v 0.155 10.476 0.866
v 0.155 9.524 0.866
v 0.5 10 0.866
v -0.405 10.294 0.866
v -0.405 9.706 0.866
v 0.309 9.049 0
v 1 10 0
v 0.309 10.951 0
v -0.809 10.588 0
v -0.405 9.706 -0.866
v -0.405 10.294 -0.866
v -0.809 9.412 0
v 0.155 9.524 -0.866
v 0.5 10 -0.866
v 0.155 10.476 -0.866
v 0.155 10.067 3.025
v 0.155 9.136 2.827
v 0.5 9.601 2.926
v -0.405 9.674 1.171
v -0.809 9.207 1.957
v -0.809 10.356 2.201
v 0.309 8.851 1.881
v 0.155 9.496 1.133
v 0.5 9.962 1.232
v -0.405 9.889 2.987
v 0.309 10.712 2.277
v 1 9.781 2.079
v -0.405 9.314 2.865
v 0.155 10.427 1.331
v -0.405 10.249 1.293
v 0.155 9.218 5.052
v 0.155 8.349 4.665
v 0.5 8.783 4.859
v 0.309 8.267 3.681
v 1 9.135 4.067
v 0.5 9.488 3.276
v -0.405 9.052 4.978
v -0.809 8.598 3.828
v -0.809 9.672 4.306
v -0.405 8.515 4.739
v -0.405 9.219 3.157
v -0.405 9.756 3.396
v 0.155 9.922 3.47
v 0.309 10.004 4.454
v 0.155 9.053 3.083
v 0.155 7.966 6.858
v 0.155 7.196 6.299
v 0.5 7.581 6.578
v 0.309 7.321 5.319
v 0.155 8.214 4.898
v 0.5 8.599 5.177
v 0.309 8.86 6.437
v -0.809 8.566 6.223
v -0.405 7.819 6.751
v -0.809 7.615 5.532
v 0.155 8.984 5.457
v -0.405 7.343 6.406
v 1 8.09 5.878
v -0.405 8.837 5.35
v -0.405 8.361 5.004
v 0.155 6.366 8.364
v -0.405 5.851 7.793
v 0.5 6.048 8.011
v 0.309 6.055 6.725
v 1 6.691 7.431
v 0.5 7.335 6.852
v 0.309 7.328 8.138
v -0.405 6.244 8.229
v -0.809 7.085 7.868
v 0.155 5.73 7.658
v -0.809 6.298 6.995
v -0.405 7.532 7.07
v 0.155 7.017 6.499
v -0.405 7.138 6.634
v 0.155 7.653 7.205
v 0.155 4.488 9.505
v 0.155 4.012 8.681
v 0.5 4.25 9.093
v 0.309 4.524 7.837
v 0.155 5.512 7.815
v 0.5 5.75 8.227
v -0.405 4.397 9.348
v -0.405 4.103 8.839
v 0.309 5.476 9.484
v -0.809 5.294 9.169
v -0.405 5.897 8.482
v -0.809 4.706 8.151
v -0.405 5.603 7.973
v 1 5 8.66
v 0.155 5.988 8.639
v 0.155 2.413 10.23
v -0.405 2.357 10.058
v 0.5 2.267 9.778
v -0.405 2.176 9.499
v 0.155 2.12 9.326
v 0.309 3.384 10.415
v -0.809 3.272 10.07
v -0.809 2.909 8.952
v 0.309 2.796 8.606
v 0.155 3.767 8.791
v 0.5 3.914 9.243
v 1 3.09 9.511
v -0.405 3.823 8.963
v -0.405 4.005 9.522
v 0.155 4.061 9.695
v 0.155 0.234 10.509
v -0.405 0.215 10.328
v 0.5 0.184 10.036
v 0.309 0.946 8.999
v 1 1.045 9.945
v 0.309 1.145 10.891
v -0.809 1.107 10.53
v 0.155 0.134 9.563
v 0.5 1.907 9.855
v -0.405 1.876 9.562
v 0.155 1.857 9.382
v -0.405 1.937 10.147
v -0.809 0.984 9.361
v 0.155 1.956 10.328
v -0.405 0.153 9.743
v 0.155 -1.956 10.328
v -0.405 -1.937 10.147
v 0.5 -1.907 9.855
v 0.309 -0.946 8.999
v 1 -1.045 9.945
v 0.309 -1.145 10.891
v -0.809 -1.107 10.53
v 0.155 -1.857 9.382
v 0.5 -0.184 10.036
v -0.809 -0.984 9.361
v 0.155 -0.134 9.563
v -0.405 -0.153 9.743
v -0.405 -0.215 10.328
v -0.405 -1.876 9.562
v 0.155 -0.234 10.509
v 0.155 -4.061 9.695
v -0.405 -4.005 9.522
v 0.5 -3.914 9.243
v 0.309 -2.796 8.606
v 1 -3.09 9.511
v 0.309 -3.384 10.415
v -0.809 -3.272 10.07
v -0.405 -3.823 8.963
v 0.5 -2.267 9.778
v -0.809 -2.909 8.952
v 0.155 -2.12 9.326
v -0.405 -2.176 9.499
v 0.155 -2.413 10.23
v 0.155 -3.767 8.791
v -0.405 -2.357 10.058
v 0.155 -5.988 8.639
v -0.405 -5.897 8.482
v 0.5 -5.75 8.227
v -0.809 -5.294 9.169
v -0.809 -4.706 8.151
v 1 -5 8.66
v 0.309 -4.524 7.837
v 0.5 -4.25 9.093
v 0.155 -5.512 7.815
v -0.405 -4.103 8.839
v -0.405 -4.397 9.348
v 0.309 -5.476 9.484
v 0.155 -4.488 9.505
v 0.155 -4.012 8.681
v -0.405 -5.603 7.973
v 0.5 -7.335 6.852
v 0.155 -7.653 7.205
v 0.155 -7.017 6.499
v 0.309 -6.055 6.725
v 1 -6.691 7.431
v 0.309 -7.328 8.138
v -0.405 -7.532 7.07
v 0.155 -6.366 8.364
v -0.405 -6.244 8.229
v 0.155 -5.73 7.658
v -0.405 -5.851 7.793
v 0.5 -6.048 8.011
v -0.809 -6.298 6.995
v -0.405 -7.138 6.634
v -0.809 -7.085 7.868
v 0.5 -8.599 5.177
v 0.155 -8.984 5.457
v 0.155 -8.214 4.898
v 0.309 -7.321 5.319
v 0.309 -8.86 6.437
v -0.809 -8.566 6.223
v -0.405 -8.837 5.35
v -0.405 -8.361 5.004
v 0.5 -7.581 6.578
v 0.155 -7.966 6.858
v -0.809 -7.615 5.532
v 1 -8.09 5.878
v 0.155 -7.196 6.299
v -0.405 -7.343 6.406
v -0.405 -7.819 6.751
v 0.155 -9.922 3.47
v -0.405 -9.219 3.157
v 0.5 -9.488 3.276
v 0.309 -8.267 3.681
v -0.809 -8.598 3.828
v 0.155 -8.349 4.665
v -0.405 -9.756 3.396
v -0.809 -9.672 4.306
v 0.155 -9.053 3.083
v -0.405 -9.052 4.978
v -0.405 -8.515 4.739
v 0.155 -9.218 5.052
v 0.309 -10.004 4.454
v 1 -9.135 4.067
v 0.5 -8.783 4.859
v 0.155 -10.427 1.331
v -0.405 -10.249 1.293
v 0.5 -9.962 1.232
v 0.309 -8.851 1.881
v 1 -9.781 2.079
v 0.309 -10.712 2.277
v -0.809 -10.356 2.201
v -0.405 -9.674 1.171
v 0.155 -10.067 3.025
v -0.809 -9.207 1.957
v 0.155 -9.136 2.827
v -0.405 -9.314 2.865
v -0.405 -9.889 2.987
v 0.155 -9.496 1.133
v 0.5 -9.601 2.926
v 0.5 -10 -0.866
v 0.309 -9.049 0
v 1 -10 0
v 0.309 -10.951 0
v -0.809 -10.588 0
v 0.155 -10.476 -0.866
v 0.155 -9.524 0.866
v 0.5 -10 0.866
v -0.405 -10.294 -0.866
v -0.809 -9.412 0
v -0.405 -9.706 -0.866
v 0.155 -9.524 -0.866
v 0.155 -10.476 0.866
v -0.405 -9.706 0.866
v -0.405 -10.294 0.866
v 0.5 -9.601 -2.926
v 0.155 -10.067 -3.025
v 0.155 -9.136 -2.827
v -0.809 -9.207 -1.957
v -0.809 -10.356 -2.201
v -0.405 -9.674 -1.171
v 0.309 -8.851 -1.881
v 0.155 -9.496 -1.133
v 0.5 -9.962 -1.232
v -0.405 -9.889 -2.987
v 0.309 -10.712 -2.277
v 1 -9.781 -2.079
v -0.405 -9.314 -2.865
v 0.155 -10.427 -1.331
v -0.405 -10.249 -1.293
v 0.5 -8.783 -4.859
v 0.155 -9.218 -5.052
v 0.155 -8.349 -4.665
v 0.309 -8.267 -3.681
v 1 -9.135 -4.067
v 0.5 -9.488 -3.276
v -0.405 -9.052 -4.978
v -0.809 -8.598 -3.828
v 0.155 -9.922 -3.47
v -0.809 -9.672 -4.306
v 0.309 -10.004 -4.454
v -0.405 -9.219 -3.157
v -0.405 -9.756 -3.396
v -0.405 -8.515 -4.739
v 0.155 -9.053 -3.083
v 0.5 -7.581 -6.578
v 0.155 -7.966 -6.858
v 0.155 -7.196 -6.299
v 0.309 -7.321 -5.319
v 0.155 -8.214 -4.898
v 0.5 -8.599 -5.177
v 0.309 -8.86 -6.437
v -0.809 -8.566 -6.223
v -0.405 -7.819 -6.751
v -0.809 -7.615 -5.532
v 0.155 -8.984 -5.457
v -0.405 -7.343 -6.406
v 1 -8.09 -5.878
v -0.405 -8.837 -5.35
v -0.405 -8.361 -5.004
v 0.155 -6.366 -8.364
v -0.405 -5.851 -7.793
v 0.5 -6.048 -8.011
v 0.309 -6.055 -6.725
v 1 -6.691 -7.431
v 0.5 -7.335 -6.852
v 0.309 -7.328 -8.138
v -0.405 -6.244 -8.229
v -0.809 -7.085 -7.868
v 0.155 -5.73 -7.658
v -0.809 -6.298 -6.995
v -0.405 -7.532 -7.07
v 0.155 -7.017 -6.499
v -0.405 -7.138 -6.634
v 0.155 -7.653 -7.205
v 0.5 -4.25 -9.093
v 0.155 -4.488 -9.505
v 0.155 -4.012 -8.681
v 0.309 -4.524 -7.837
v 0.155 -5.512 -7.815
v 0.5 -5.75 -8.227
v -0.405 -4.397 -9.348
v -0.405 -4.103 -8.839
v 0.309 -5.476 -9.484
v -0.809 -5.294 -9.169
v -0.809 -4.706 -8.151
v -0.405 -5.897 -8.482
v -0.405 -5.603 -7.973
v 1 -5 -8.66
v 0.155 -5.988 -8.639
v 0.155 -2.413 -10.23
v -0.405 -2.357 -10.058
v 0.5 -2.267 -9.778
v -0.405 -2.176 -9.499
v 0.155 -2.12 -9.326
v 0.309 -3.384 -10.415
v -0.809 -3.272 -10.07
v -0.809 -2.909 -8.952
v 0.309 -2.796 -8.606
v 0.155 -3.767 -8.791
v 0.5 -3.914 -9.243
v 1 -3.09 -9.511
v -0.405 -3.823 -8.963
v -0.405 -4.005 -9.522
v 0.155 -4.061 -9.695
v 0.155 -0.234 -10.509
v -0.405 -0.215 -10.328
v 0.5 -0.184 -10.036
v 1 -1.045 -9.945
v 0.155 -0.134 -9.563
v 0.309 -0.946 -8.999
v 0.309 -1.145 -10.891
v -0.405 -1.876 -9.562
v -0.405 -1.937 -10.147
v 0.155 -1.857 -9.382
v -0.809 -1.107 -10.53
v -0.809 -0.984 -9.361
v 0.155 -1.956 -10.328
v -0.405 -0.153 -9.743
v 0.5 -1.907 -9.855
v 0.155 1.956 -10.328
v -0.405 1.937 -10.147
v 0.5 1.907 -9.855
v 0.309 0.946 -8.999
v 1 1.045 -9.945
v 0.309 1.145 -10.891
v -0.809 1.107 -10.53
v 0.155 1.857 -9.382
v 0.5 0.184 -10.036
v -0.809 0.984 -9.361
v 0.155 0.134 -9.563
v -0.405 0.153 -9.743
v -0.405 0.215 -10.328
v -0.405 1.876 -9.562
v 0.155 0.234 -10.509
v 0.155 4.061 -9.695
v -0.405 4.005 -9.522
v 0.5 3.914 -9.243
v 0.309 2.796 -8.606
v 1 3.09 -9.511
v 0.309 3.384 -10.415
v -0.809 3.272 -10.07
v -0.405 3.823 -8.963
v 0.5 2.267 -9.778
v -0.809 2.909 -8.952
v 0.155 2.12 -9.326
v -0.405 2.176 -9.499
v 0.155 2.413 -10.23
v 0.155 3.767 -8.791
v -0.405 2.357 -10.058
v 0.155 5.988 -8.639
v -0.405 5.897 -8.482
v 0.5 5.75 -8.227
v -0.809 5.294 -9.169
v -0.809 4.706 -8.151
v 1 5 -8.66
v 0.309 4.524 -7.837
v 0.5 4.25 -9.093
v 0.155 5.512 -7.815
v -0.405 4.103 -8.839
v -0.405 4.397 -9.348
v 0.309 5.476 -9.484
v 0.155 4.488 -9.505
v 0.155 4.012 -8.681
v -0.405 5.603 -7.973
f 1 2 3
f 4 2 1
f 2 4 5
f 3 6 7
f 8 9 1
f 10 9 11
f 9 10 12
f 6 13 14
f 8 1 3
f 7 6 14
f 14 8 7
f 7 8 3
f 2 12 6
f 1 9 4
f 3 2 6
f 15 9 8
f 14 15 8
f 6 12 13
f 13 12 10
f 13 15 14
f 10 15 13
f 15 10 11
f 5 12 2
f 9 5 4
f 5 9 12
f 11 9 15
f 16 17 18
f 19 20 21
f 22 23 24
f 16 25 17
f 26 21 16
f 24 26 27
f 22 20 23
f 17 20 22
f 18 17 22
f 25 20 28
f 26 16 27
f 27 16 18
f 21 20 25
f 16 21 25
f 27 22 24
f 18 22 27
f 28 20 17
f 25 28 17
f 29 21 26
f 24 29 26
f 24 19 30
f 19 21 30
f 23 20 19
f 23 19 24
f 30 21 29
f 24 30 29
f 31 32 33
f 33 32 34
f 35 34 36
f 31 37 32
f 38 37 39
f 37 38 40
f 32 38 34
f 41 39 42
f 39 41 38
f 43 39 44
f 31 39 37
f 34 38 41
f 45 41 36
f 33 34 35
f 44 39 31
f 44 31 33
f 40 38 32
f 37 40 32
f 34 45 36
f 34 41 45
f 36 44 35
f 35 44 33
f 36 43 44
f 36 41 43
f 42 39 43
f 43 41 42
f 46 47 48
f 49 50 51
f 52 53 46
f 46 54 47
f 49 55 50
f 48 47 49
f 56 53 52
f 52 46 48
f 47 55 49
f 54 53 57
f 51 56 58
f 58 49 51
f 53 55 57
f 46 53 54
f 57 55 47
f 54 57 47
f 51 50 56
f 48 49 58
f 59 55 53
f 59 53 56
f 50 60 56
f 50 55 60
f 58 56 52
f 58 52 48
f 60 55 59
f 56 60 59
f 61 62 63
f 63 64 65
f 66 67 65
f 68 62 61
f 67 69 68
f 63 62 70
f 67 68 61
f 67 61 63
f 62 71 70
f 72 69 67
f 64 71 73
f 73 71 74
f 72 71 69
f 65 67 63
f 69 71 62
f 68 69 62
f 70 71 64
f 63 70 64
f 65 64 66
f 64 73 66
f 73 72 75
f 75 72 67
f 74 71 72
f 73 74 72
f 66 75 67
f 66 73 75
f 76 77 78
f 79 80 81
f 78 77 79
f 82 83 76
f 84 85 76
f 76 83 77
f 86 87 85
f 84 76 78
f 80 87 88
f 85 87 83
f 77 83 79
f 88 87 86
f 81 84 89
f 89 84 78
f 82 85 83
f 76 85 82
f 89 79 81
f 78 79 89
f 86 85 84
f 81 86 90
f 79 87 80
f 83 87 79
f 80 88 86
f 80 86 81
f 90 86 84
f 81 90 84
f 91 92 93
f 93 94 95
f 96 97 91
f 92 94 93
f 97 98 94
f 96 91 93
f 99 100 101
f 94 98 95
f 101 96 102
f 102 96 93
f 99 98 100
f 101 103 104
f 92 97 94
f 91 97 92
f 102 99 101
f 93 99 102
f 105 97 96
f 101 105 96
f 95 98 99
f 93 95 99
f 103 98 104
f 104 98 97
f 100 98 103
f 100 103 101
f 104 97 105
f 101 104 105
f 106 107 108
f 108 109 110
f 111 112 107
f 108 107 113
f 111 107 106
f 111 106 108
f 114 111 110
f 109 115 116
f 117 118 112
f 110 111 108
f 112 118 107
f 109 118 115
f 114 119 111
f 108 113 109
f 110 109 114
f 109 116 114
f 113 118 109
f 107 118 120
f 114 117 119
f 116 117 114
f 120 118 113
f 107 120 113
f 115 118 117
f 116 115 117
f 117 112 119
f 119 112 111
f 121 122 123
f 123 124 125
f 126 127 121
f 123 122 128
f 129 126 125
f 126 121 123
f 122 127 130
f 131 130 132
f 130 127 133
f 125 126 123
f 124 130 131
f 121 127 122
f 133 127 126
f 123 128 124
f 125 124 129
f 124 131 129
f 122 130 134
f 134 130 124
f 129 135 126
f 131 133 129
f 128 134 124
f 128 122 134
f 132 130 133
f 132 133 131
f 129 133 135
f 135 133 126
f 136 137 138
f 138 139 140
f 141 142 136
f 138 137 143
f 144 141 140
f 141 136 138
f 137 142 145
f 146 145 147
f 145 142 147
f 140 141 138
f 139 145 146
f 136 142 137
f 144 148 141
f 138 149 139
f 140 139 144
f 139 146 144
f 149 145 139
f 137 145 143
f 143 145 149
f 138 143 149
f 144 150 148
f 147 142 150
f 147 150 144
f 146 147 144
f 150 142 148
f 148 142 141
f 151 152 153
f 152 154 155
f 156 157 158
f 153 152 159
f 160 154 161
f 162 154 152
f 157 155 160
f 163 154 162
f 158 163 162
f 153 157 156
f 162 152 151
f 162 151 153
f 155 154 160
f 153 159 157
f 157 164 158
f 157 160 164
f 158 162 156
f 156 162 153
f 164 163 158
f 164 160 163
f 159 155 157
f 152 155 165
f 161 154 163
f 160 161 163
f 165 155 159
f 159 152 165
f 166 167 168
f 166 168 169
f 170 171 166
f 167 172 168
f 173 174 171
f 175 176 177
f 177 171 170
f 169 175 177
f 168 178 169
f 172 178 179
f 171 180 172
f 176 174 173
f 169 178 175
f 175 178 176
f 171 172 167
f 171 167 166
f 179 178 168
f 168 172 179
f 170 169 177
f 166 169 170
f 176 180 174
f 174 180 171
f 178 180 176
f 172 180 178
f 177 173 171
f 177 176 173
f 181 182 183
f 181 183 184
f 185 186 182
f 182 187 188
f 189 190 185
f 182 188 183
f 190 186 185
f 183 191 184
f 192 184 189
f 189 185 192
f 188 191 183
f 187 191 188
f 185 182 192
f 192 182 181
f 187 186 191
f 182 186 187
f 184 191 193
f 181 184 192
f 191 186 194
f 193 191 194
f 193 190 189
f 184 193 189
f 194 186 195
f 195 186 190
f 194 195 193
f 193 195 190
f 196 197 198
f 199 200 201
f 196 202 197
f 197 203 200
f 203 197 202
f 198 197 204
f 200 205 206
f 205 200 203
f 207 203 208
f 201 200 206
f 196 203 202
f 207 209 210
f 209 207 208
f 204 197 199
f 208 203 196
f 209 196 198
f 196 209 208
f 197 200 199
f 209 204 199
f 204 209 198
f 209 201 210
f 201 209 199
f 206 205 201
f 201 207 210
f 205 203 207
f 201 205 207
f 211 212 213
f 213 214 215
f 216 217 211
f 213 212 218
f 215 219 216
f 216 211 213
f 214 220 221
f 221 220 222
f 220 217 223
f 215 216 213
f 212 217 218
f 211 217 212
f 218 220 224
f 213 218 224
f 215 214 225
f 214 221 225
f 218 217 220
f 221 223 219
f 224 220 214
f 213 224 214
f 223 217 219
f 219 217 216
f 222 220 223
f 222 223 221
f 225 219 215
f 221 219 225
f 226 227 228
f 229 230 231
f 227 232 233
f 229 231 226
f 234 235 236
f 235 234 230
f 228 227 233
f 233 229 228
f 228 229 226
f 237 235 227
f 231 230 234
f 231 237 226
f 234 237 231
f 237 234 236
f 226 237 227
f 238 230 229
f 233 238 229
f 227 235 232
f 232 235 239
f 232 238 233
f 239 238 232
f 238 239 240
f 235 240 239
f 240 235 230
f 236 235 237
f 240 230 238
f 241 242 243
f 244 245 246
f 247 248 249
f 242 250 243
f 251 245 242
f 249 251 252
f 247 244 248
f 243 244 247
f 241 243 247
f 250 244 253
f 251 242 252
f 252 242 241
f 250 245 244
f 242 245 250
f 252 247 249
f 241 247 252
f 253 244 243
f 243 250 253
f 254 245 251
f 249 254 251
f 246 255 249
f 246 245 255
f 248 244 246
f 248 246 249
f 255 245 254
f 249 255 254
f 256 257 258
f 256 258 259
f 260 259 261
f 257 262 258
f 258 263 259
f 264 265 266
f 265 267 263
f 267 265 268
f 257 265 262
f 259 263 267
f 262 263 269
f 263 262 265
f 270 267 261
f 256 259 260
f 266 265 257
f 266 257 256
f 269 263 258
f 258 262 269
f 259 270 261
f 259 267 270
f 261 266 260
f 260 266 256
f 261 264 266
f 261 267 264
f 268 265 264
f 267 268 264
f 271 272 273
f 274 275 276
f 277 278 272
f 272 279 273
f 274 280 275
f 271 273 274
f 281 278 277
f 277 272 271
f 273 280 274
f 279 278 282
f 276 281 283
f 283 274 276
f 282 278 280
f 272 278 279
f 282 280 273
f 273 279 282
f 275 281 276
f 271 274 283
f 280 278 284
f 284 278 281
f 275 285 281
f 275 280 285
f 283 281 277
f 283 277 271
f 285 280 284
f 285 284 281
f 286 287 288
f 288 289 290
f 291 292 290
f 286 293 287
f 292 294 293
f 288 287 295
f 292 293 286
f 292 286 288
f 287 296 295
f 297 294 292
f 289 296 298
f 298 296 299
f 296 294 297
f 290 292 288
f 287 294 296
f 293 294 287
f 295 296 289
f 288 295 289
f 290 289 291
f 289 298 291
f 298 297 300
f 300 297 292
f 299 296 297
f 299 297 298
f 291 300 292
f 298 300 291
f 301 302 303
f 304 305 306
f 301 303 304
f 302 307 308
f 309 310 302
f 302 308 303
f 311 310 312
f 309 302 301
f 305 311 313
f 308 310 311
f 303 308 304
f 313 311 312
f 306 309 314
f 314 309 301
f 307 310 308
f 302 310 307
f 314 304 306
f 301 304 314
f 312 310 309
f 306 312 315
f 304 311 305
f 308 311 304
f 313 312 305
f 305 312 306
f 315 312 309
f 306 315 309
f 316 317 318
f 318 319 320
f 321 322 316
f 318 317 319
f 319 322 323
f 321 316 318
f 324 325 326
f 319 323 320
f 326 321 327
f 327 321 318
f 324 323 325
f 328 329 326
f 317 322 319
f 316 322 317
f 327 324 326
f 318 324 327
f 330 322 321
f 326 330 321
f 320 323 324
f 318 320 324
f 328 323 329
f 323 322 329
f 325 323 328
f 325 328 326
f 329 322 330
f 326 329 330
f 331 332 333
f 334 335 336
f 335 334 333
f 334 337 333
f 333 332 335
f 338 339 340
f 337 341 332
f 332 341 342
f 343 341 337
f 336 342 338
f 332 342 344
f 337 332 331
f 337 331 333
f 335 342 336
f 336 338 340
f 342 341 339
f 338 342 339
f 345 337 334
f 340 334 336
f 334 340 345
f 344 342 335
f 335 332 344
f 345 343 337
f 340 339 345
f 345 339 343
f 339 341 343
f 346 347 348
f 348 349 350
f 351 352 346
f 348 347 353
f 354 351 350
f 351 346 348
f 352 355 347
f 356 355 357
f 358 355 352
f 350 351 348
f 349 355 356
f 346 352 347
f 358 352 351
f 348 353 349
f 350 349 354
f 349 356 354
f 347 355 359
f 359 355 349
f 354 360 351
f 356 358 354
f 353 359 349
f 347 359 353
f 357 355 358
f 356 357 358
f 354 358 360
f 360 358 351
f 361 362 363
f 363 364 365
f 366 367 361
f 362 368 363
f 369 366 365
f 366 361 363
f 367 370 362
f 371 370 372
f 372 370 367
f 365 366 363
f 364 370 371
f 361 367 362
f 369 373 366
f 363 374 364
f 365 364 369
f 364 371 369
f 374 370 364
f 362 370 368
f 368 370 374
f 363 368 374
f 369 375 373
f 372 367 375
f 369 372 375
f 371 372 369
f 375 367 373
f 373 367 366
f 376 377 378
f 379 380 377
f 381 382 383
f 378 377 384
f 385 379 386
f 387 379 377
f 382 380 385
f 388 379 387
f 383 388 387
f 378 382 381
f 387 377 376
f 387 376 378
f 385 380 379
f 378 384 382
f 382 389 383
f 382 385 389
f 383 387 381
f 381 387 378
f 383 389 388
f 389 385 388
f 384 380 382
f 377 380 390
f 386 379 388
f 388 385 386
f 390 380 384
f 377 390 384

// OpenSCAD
// Note: The middle parameter in the range designation 
// ('0.2' in this case) is the 'increment-by' value
// Warning: Depending on the 'increment-by' value, the
// real end value will be smaller than the given one.
for ( i = [0 : 0.2 : 5] )
{
    rotate( i * 360 / 6, [1, 0, 0])
    translate([0, 10, 0])
    sphere(r = 1);
}
